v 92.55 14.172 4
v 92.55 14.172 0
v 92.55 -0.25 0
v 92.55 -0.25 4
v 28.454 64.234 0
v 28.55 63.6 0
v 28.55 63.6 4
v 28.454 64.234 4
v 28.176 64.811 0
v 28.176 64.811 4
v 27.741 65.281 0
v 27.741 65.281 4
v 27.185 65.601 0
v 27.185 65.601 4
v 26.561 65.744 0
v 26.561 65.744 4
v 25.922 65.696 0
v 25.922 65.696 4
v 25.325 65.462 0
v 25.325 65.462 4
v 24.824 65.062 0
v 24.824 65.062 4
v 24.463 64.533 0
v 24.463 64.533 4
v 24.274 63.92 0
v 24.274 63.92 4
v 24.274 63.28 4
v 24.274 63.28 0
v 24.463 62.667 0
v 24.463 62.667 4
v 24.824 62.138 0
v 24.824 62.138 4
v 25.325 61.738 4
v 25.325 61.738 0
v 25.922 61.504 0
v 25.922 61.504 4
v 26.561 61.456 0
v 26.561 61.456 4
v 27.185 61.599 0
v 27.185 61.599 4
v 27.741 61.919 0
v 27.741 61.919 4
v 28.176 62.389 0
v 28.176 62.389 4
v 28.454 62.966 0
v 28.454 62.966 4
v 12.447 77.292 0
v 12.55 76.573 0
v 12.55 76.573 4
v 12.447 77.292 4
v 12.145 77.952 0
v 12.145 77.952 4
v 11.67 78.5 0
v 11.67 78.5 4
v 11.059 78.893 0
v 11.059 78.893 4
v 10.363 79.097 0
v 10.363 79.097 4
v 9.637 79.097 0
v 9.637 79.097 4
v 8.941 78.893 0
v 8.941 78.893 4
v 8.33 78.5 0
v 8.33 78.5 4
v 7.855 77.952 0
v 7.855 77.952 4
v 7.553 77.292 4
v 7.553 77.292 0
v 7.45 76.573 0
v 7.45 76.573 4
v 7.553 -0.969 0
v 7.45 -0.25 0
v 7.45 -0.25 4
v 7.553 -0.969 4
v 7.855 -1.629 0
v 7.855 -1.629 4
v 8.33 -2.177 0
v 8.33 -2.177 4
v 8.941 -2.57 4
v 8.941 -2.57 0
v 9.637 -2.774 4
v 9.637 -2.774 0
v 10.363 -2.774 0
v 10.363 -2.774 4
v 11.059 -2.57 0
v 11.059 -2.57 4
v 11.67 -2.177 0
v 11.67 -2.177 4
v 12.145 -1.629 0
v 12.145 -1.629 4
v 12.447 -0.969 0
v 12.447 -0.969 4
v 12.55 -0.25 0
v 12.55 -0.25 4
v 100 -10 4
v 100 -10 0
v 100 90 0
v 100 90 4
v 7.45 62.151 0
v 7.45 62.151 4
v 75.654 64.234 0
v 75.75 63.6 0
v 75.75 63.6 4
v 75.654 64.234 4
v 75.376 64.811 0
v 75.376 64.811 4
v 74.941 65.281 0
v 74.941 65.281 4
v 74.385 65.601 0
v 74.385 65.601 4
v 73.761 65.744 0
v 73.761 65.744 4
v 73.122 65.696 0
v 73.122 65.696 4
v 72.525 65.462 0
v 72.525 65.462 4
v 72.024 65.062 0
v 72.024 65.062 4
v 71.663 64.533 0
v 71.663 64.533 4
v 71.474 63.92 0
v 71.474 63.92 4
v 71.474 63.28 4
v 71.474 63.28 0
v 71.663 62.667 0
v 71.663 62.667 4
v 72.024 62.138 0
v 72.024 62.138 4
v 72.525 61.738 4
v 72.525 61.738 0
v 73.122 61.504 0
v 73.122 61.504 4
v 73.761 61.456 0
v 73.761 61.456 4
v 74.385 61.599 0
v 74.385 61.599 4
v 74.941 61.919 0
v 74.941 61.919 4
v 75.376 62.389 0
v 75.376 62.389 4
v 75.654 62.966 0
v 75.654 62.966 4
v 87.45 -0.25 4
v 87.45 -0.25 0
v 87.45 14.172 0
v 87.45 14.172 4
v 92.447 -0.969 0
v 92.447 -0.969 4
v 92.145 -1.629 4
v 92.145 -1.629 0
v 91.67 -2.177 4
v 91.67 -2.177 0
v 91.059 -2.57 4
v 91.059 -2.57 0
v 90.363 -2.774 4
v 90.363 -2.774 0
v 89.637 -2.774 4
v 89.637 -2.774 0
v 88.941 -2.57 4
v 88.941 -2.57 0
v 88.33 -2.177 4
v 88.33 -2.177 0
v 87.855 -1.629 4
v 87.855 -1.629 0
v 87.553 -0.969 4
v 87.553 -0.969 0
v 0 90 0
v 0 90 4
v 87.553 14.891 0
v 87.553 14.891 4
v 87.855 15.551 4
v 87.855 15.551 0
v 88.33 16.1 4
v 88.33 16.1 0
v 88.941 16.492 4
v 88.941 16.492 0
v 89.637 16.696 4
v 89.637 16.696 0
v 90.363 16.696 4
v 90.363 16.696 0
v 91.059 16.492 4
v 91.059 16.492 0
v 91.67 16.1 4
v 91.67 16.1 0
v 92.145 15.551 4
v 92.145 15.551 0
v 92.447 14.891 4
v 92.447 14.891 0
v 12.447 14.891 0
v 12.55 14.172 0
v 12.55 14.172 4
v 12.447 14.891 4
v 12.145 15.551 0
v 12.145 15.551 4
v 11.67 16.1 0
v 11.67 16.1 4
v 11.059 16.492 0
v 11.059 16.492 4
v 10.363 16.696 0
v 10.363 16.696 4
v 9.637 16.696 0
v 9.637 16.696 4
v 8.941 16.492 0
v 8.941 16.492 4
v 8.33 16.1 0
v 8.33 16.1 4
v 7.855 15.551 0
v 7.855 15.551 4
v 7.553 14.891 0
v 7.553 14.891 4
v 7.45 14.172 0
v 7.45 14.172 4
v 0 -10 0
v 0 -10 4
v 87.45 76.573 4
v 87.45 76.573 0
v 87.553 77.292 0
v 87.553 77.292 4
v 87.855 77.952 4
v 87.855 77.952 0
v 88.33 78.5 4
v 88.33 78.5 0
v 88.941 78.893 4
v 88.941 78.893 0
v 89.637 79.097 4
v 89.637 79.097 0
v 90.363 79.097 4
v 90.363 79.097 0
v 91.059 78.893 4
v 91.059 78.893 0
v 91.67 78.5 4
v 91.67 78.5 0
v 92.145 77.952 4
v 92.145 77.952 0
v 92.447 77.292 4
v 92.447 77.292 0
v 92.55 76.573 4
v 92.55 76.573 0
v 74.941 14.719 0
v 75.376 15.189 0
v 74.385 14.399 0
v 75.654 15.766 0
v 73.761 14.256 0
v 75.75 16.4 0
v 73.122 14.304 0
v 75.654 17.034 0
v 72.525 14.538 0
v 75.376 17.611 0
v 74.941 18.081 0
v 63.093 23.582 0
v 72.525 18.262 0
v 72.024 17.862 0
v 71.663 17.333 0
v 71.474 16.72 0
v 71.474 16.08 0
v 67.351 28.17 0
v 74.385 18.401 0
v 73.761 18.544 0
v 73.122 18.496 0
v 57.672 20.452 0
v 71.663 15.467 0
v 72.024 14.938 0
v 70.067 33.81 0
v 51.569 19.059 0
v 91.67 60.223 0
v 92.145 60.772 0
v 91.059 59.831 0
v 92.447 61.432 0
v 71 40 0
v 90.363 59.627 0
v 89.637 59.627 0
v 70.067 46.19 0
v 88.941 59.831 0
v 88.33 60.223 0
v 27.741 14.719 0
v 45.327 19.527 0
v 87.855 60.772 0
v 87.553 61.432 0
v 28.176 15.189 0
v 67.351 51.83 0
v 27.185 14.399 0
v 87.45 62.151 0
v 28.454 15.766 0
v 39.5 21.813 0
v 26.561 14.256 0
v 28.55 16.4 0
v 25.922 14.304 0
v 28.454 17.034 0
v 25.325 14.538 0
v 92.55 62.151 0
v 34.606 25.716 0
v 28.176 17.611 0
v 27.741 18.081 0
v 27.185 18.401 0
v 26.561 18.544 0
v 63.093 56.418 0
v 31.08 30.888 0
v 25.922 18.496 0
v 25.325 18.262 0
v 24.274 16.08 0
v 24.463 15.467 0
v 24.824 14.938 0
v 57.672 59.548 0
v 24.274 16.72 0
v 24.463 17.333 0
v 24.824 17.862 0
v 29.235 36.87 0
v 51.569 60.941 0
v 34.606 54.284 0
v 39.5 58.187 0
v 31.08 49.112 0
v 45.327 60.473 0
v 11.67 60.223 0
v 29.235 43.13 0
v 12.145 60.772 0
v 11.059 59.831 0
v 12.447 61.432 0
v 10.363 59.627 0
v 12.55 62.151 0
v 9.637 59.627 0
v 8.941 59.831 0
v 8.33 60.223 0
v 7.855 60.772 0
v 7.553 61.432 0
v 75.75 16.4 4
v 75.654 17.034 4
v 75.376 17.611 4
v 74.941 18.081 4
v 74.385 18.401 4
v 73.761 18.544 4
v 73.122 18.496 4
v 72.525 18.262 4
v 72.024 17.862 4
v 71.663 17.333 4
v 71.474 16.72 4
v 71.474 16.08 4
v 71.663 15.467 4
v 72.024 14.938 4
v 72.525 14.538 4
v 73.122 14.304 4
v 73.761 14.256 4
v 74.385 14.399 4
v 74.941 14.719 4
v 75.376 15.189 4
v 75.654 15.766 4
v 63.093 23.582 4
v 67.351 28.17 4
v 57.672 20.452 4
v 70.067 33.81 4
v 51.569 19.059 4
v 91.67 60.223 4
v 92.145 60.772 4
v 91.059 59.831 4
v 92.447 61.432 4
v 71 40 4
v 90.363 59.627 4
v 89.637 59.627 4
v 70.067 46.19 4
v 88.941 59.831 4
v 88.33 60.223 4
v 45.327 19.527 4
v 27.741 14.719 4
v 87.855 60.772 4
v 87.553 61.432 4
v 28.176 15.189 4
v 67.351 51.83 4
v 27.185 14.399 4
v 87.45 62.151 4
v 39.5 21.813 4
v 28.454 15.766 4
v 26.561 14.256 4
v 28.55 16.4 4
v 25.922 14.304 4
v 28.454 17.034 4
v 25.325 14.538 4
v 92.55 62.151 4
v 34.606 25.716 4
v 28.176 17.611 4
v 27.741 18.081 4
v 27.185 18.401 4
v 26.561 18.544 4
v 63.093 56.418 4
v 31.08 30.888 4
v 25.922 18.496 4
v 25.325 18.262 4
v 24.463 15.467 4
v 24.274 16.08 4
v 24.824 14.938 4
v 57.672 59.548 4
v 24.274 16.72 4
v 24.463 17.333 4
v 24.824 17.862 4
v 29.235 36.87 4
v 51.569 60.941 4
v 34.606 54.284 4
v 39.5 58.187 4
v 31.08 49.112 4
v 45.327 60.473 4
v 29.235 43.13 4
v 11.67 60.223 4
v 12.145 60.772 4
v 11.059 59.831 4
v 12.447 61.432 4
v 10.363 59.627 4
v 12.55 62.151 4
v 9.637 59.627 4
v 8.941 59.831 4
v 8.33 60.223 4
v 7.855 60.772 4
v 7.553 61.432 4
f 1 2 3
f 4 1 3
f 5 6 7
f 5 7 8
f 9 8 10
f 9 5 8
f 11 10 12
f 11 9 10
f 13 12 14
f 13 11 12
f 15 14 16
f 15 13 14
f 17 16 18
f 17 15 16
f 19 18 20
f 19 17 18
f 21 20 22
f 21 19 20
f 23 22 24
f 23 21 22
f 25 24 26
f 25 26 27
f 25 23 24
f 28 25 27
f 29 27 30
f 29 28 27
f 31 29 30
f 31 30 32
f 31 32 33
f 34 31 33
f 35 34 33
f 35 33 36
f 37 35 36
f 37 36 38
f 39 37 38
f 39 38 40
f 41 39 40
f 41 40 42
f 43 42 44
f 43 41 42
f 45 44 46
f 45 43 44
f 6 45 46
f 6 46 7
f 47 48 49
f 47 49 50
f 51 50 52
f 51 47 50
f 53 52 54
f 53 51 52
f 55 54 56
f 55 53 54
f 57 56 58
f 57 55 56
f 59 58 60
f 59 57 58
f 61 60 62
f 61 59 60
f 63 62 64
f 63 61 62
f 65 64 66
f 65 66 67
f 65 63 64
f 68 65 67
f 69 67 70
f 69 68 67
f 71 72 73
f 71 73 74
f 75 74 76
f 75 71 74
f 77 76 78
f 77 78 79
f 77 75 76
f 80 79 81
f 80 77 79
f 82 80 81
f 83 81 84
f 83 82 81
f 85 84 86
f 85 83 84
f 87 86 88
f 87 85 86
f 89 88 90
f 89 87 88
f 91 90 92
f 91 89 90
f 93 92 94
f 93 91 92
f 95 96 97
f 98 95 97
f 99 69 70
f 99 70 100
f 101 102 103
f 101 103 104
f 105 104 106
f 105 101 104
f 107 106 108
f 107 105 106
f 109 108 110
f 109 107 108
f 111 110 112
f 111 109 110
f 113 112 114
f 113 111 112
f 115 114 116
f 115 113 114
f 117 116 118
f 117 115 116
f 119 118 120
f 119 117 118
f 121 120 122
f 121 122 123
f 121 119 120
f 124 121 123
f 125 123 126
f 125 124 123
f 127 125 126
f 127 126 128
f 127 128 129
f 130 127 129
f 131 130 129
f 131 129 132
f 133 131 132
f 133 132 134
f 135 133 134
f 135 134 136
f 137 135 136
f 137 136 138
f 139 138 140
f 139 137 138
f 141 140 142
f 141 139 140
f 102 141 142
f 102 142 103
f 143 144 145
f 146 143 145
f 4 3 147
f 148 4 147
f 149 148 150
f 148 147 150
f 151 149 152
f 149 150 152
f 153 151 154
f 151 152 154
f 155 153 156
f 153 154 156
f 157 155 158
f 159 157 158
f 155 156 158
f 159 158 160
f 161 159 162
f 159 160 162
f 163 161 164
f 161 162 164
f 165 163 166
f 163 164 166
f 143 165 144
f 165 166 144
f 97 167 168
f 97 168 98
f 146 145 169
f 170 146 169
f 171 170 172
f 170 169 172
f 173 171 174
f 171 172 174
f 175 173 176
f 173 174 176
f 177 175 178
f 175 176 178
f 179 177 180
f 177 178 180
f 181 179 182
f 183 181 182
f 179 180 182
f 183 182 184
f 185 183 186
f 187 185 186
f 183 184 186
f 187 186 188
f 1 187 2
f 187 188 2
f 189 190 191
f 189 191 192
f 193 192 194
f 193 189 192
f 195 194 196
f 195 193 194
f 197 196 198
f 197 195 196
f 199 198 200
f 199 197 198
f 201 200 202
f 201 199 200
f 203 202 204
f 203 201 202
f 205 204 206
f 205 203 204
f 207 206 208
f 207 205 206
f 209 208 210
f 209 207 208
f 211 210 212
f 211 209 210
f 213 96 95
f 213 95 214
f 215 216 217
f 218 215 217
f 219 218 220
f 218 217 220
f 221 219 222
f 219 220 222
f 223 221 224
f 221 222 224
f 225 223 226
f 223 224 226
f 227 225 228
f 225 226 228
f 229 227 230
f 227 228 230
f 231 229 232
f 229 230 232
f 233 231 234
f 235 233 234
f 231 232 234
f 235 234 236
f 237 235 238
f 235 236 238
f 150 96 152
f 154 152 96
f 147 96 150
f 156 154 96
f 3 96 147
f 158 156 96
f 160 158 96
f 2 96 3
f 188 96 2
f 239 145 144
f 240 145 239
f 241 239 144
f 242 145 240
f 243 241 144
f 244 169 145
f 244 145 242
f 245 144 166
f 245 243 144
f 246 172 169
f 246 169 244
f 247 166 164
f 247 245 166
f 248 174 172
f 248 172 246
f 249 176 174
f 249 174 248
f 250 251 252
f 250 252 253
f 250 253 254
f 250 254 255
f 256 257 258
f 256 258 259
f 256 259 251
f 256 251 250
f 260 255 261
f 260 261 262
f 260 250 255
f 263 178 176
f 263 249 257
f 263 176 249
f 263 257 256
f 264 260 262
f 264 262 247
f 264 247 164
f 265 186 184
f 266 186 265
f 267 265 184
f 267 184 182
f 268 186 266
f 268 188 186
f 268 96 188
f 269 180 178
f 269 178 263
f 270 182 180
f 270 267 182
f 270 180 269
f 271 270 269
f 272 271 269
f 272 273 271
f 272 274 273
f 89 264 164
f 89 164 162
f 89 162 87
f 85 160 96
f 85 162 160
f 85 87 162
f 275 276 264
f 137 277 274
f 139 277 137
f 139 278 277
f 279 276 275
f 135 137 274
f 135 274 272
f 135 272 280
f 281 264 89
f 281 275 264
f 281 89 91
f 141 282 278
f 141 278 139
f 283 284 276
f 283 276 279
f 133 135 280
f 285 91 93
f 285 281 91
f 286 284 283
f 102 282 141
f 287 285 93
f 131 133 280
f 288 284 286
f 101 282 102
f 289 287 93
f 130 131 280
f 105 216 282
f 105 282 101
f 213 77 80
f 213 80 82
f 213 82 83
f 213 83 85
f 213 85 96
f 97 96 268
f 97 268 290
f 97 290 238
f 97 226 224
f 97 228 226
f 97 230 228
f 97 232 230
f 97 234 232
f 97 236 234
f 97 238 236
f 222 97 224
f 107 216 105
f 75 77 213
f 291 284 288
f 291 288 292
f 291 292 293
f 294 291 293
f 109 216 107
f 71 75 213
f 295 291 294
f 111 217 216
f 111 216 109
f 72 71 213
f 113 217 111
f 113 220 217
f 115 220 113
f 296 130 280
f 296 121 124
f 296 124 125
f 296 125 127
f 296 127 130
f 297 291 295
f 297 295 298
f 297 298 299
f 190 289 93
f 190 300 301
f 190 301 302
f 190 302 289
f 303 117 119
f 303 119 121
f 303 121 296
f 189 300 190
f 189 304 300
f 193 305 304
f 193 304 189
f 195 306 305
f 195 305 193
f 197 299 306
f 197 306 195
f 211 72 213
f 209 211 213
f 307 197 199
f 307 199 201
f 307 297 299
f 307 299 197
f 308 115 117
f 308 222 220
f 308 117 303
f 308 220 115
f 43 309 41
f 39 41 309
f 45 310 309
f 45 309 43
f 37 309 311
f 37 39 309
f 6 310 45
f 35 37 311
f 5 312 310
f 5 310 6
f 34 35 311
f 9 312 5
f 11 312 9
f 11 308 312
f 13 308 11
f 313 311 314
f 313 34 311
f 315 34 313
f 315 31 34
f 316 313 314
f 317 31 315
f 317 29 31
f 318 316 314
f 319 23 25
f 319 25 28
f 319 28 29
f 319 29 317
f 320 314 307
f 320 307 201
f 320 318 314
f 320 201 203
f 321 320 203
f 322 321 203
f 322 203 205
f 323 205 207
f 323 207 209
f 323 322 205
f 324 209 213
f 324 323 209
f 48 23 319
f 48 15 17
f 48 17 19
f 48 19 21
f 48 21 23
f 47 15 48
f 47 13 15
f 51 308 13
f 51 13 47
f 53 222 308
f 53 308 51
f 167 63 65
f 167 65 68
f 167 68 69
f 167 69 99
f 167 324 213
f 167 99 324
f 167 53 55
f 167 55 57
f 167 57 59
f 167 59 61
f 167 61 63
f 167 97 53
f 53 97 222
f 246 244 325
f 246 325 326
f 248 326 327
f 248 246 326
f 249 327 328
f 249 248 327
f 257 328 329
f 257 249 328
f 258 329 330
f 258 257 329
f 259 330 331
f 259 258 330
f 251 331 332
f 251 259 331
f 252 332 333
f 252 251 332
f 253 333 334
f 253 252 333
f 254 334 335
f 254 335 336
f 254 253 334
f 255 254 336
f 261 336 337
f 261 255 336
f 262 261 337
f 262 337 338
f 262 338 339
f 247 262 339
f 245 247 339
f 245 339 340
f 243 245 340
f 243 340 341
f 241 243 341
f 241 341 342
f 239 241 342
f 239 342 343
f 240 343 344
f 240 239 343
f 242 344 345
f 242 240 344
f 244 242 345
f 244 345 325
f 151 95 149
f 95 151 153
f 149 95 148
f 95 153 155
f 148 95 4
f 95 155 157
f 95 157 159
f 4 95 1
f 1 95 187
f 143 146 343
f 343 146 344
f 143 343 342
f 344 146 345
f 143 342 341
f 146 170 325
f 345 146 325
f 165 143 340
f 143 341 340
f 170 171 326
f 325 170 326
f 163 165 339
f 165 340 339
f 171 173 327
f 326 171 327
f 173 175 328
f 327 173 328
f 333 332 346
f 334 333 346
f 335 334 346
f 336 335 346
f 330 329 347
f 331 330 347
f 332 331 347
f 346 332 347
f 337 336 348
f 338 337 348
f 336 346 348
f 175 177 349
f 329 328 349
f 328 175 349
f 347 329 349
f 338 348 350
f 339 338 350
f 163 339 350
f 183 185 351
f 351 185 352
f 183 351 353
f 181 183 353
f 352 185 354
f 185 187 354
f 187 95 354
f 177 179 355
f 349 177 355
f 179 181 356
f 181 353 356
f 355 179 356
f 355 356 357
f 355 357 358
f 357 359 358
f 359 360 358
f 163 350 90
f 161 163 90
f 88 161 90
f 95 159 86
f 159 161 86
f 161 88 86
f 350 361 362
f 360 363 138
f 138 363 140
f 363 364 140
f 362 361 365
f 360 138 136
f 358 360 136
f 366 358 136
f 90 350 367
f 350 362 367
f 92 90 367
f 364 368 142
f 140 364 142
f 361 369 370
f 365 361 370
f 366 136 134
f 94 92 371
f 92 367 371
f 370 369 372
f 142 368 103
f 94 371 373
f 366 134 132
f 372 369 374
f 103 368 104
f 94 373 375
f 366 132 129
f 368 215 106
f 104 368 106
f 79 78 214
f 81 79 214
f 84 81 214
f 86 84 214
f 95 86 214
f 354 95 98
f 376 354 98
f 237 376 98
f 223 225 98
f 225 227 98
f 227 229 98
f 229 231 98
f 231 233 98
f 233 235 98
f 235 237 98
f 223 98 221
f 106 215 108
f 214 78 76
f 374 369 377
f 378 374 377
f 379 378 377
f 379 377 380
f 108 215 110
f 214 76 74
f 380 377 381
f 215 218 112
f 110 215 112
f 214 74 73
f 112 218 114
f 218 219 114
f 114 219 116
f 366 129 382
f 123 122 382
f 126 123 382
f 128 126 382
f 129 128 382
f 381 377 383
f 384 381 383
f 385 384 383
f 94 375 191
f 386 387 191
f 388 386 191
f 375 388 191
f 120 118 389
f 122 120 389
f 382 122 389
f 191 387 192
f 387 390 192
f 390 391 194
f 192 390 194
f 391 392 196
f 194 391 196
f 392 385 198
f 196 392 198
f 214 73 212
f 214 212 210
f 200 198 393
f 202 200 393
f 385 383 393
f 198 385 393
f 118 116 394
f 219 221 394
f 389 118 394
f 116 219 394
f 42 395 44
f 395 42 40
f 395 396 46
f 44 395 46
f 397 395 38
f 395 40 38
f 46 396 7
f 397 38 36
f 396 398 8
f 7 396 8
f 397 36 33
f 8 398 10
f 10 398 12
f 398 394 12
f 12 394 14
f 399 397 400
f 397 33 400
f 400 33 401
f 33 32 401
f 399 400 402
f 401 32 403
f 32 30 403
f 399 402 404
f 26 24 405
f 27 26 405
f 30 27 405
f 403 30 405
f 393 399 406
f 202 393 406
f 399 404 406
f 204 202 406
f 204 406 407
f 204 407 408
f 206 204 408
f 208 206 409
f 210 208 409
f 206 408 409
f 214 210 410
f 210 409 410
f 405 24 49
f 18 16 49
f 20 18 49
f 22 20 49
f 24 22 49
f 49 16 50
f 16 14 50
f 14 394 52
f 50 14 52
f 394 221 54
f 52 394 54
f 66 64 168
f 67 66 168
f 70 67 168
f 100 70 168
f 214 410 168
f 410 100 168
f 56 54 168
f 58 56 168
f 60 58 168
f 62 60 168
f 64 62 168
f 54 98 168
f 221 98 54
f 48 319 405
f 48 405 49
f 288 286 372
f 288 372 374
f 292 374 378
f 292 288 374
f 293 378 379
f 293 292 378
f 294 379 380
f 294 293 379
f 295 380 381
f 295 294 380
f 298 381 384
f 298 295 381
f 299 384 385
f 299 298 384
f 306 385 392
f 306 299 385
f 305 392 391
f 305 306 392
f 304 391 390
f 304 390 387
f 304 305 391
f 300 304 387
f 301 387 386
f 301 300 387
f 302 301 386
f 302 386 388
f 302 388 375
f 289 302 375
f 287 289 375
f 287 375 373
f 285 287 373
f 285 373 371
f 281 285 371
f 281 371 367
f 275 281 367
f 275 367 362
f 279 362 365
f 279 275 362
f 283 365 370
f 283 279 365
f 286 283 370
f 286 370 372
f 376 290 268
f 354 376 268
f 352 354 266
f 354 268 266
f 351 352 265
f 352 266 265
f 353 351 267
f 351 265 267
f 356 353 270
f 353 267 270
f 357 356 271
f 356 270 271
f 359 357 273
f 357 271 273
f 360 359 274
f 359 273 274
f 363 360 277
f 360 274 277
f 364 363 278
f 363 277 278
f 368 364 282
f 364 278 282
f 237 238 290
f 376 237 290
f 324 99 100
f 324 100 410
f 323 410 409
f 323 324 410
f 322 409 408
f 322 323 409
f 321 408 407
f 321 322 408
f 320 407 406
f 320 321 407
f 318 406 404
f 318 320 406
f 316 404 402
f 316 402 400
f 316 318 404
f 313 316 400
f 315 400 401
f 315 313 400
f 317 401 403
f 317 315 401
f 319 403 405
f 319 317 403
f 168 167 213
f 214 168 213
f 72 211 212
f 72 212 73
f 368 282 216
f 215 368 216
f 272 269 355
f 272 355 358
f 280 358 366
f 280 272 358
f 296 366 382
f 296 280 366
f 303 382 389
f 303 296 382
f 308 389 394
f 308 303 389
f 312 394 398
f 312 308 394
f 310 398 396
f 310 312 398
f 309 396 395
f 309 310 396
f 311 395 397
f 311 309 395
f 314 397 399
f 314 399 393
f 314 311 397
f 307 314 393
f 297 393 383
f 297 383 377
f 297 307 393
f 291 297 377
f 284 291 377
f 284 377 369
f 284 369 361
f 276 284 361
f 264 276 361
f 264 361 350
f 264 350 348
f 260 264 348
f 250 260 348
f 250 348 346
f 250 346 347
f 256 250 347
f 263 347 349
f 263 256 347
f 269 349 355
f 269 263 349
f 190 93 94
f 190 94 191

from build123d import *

# Parameters (mm, degrees)
SKETCH1_R           = 2.15
SKETCH1_R_2         = 21
BOSS_EXTRUDE1_DEPTH = 4


with BuildPart() as part:
    # Sketch1 → Boss-Extrude1 (new body)
    with BuildSketch(Plane.XY):
        Polygon((0, 0), (0, 90), (100, 90), (100, 2.372295937), (100, -10), (0, -10), align=None)
        with Locations((26.4, 63.6)):
            Circle(SKETCH1_R, mode=Mode.SUBTRACT)
        with Locations((73.6, 63.6)):
            Circle(SKETCH1_R, mode=Mode.SUBTRACT)
        with Locations((73.6, 16.4)):
            Circle(SKETCH1_R, mode=Mode.SUBTRACT)
        with Locations((26.4, 16.4)):
            Circle(SKETCH1_R, mode=Mode.SUBTRACT)
        with Locations((50, 40)):
            Circle(SKETCH1_R_2, mode=Mode.SUBTRACT)
        with BuildLine():
            Line((7.45, 14.17243776), (7.45, -0.25030049))
            ThreePointArc((7.45, -0.25030049), (10, -2.80030049), (12.55, -0.25030049))
            Line((12.55, -0.25030049), (12.55, 14.17243776))
            ThreePointArc((12.55, 14.17243776), (10, 16.72243776), (7.45, 14.17243776))
        make_face(mode=Mode.SUBTRACT)
        with BuildLine():
            Line((87.45, 62.150571419), (87.45, 76.57330967))
            ThreePointArc((87.45, 76.57330967), (90, 79.12330967), (92.55, 76.57330967))
            Line((92.55, 76.57330967), (92.55, 62.150571419))
            ThreePointArc((92.55, 62.150571419), (90, 59.600571419), (87.45, 62.150571419))
        make_face(mode=Mode.SUBTRACT)
        with BuildLine():
            Line((92.55, 14.17243776), (92.55, -0.25030049))
            ThreePointArc((92.55, -0.25030049), (90, -2.80030049), (87.45, -0.25030049))
            Line((87.45, -0.25030049), (87.45, 14.17243776))
            ThreePointArc((87.45, 14.17243776), (90, 16.72243776), (92.55, 14.17243776))
        make_face(mode=Mode.SUBTRACT)
        with BuildLine():
            Line((12.55, 62.150571419), (12.55, 76.57330967))
            ThreePointArc((12.55, 76.57330967), (10, 79.12330967), (7.45, 76.57330967))
            Line((7.45, 76.57330967), (7.45, 62.150571419))
            ThreePointArc((7.45, 62.150571419), (10, 59.600571419), (12.55, 62.150571419))
        make_face(mode=Mode.SUBTRACT)
    extrude(amount=BOSS_EXTRUDE1_DEPTH)


solid = part.part
